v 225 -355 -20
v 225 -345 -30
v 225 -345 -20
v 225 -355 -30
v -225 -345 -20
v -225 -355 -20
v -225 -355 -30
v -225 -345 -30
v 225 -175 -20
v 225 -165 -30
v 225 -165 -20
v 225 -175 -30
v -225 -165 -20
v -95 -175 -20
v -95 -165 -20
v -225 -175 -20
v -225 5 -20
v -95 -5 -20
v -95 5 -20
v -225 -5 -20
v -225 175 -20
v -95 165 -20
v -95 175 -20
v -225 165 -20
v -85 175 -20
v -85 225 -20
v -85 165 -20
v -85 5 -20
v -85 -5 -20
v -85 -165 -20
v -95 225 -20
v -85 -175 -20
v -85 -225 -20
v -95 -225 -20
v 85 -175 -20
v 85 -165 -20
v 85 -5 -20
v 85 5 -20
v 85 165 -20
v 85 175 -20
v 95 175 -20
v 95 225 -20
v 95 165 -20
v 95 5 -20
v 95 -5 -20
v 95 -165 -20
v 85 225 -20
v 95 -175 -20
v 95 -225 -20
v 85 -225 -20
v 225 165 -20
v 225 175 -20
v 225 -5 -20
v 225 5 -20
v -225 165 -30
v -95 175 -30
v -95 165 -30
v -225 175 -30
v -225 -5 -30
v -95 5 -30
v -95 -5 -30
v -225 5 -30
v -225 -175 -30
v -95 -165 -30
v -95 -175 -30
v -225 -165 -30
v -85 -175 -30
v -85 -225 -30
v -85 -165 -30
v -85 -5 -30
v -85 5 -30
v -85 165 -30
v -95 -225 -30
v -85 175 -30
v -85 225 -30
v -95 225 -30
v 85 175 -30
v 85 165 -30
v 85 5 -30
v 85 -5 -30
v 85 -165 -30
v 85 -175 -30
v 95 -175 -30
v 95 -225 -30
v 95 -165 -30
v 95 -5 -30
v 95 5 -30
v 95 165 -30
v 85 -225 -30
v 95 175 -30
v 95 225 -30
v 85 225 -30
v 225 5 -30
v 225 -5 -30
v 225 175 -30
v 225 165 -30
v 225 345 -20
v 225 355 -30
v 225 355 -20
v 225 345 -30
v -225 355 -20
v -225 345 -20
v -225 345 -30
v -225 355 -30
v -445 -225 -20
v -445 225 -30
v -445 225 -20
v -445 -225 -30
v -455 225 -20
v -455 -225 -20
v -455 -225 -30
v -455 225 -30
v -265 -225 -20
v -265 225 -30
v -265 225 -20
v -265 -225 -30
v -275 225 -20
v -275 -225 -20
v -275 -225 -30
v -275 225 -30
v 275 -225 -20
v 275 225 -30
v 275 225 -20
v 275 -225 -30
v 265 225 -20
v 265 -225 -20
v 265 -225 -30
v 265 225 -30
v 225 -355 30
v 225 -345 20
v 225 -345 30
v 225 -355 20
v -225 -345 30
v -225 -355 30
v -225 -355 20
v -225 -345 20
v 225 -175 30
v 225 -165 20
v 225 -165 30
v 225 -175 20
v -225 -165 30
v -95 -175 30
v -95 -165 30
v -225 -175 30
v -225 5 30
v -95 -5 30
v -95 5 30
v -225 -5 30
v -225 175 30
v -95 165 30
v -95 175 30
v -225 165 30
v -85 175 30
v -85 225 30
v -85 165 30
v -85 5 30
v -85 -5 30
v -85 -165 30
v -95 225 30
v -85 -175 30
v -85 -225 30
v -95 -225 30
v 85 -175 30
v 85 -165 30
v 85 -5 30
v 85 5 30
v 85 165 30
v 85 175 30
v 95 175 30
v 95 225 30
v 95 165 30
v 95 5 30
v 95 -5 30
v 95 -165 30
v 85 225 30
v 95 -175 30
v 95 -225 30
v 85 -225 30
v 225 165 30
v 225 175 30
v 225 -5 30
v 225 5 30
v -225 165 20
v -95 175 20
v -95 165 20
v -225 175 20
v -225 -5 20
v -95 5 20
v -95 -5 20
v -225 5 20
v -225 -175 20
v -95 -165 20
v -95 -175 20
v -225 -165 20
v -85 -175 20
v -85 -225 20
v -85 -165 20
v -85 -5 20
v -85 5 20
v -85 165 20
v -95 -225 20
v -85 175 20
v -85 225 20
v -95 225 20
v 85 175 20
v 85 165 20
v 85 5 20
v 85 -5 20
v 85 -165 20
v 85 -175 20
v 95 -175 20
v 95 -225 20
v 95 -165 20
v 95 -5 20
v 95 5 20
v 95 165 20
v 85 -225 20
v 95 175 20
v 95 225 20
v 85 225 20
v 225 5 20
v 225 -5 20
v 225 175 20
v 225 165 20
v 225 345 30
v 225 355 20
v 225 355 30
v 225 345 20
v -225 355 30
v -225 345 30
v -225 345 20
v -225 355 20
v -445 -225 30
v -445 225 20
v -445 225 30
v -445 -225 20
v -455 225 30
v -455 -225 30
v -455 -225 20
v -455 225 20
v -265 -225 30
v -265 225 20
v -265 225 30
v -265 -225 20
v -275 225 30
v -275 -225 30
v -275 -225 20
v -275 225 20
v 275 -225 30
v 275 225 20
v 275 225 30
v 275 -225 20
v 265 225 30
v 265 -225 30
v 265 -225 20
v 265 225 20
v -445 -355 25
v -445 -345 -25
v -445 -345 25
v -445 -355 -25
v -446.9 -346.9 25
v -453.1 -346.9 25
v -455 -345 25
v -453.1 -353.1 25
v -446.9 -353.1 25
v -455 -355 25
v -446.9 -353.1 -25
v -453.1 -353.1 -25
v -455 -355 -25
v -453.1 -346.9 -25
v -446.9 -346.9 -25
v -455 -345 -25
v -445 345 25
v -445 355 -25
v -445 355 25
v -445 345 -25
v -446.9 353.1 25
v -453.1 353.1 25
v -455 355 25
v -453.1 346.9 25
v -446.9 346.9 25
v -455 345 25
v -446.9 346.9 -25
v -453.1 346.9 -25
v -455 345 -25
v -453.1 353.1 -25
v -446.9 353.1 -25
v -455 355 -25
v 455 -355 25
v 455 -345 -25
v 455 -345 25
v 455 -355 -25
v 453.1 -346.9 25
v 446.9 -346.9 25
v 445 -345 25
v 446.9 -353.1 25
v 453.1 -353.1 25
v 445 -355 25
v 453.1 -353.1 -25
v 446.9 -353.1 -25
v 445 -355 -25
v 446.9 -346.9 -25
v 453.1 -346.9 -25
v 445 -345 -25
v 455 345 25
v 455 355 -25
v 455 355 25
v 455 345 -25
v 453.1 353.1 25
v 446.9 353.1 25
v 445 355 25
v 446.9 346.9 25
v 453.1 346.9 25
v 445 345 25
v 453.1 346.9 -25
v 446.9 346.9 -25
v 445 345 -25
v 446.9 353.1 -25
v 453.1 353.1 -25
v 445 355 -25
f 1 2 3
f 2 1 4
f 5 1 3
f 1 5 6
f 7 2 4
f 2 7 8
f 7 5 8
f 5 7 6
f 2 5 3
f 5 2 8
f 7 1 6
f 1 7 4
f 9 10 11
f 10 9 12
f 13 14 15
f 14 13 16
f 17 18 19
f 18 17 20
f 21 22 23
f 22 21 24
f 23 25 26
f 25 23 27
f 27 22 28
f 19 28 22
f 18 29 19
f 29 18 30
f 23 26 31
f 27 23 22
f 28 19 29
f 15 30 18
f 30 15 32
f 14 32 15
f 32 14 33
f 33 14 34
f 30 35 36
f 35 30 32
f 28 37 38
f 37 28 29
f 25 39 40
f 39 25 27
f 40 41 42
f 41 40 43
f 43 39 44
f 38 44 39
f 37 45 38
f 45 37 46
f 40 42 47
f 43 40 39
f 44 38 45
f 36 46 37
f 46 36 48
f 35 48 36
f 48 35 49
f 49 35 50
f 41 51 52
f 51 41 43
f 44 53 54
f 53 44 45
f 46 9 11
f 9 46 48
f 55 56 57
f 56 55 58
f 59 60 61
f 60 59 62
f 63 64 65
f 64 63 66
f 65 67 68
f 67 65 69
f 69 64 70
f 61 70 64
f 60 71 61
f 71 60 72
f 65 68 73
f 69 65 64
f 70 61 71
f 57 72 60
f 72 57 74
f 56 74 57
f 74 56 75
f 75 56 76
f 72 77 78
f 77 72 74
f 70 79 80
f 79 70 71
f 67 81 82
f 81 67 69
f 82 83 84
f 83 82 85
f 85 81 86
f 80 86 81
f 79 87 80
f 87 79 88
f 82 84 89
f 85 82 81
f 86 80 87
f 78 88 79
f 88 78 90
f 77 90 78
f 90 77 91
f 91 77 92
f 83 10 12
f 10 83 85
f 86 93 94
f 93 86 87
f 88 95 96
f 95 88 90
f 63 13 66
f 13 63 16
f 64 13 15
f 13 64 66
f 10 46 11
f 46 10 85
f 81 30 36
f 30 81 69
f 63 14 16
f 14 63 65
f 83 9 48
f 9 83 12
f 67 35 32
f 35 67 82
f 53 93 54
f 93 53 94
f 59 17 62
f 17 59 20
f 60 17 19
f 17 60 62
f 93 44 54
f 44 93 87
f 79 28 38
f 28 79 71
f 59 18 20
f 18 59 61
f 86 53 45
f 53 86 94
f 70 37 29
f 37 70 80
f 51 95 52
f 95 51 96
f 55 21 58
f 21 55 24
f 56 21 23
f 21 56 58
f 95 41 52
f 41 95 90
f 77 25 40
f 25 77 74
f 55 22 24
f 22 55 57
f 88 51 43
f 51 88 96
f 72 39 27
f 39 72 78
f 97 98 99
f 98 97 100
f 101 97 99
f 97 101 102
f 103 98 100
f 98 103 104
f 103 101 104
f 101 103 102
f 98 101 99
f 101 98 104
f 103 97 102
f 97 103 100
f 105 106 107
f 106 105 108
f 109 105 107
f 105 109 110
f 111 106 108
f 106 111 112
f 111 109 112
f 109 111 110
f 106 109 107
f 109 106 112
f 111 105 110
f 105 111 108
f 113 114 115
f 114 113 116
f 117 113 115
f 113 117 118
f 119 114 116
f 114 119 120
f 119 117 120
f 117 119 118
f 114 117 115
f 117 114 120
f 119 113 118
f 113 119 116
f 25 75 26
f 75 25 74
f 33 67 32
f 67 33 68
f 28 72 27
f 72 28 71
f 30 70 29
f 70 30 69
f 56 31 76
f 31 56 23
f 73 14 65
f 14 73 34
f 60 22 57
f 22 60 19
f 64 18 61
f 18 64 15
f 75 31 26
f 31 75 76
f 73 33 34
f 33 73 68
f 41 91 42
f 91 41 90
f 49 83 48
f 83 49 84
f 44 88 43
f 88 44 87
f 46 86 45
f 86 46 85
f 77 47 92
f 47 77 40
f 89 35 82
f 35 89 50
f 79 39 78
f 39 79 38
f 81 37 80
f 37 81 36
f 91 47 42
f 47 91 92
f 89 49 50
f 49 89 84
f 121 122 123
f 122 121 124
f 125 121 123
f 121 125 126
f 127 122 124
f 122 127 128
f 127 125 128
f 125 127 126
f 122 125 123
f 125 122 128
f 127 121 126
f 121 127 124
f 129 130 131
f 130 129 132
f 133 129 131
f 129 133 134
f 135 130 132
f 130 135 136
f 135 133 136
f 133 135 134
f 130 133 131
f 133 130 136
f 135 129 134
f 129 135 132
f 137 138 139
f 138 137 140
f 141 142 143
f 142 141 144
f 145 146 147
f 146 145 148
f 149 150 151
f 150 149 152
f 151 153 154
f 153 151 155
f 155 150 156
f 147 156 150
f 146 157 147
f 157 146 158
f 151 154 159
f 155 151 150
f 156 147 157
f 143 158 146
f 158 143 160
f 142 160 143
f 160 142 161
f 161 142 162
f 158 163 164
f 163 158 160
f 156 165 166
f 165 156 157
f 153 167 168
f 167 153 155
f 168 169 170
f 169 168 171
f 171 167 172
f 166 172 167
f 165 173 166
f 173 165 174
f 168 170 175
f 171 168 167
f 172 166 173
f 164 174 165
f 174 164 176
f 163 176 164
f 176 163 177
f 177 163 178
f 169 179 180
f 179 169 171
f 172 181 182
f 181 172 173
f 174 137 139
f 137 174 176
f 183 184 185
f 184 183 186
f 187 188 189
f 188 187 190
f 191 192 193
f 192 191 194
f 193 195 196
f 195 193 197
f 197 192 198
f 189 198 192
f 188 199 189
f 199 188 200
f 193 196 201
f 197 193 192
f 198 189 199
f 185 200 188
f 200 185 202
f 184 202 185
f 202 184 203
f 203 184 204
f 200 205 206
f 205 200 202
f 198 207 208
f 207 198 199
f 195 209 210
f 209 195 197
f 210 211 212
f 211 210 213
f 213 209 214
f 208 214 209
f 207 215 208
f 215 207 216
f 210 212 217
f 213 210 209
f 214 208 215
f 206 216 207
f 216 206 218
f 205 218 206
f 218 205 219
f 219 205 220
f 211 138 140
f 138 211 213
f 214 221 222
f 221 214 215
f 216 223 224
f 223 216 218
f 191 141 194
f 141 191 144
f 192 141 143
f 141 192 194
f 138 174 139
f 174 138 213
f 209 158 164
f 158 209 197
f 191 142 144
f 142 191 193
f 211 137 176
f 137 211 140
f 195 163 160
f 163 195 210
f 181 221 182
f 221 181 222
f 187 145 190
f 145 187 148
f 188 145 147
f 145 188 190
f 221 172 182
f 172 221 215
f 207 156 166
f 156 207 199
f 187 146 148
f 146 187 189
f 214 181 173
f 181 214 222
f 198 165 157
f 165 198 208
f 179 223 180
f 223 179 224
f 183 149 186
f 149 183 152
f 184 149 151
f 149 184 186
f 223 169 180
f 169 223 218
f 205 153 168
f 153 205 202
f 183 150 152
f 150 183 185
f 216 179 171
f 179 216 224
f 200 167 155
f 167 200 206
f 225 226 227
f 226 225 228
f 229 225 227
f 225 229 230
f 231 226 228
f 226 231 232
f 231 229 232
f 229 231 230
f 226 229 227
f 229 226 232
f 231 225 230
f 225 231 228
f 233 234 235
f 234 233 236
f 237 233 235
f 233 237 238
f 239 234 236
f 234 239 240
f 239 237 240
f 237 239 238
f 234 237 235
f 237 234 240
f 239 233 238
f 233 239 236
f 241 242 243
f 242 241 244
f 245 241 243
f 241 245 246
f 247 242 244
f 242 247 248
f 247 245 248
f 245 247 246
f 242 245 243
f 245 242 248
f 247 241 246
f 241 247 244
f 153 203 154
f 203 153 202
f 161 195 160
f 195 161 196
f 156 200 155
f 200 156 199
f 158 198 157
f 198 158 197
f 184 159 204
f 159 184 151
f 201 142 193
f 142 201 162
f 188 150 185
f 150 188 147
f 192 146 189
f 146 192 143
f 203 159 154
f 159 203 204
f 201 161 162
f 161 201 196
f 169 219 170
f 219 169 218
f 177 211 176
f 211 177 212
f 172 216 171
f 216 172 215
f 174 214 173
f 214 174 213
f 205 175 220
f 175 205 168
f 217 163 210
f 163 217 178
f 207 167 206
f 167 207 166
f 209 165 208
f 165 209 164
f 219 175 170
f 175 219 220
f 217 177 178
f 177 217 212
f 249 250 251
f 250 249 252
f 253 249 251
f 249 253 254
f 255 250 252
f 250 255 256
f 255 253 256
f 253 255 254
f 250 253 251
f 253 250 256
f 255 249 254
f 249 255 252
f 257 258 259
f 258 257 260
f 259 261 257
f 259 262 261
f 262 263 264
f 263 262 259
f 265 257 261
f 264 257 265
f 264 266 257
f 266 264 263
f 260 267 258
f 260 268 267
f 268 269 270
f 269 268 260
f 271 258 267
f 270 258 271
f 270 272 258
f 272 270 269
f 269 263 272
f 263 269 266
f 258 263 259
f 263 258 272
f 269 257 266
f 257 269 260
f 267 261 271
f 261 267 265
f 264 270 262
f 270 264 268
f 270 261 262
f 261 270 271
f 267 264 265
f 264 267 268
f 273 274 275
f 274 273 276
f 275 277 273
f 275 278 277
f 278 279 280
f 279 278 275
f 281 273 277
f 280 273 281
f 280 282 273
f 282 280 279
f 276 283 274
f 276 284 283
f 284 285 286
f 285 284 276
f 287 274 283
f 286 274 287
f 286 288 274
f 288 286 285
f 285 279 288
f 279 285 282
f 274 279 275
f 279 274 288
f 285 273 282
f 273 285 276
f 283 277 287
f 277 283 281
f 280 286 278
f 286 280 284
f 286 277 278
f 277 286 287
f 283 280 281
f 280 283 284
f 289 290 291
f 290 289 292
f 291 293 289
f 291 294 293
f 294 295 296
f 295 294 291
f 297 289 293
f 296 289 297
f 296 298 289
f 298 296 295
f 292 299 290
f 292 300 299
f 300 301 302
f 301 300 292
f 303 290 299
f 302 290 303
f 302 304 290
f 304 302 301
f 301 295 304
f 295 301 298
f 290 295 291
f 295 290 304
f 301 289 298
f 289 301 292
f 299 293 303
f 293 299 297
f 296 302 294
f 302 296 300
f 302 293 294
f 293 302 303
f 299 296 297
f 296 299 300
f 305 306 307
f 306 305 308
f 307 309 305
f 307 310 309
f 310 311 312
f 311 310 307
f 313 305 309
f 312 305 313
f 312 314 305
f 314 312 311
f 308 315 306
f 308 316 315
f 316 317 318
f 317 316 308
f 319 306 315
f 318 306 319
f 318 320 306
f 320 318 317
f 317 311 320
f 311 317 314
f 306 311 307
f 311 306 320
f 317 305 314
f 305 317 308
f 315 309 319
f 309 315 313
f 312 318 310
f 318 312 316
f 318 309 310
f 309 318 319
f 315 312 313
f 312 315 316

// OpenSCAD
// Middle layer (x15 needed)
module cage_layer_middle() {
    bar_thick = 10;
    gap = 80;
    layer_h = 50;
    rod_hole = 6.2;
    
    // Bottom horizontal frame
    for(y = [-175, -85, 0, 85, 175]) {
        translate([0, y*2, -layer_h/2])
            cube([450, bar_thick, bar_thick], center=true);
    }
    for(x = [-225, -135, -45, 45, 135]) {
        translate([x*2, 0, -layer_h/2])
            cube([bar_thick, 450, bar_thick], center=true);
    }
    
    // Top horizontal frame
    for(y = [-175, -85, 0, 85, 175]) {
        translate([0, y*2, layer_h/2])
            cube([450, bar_thick, bar_thick], center=true);
    }
    for(x = [-225, -135, -45, 45, 135]) {
        translate([x*2, 0, layer_h/2])
            cube([bar_thick, 450, bar_thick], center=true);
    }
    
    // Vertical corner stubs with rod holes
    corners = [[-225, -175], [-225, 175], [225, -175], [225, 175]];
    for(c = corners) {
        translate([c[0]*2, c[1]*2, 0])
        difference() {
            cube([bar_thick, bar_thick, layer_h], center=true);
            translate([0, 0, 0])
                cube([rod_hole, rod_hole, layer_h+0.1], center=true);
        }
    }
}

cage_layer_middle();
